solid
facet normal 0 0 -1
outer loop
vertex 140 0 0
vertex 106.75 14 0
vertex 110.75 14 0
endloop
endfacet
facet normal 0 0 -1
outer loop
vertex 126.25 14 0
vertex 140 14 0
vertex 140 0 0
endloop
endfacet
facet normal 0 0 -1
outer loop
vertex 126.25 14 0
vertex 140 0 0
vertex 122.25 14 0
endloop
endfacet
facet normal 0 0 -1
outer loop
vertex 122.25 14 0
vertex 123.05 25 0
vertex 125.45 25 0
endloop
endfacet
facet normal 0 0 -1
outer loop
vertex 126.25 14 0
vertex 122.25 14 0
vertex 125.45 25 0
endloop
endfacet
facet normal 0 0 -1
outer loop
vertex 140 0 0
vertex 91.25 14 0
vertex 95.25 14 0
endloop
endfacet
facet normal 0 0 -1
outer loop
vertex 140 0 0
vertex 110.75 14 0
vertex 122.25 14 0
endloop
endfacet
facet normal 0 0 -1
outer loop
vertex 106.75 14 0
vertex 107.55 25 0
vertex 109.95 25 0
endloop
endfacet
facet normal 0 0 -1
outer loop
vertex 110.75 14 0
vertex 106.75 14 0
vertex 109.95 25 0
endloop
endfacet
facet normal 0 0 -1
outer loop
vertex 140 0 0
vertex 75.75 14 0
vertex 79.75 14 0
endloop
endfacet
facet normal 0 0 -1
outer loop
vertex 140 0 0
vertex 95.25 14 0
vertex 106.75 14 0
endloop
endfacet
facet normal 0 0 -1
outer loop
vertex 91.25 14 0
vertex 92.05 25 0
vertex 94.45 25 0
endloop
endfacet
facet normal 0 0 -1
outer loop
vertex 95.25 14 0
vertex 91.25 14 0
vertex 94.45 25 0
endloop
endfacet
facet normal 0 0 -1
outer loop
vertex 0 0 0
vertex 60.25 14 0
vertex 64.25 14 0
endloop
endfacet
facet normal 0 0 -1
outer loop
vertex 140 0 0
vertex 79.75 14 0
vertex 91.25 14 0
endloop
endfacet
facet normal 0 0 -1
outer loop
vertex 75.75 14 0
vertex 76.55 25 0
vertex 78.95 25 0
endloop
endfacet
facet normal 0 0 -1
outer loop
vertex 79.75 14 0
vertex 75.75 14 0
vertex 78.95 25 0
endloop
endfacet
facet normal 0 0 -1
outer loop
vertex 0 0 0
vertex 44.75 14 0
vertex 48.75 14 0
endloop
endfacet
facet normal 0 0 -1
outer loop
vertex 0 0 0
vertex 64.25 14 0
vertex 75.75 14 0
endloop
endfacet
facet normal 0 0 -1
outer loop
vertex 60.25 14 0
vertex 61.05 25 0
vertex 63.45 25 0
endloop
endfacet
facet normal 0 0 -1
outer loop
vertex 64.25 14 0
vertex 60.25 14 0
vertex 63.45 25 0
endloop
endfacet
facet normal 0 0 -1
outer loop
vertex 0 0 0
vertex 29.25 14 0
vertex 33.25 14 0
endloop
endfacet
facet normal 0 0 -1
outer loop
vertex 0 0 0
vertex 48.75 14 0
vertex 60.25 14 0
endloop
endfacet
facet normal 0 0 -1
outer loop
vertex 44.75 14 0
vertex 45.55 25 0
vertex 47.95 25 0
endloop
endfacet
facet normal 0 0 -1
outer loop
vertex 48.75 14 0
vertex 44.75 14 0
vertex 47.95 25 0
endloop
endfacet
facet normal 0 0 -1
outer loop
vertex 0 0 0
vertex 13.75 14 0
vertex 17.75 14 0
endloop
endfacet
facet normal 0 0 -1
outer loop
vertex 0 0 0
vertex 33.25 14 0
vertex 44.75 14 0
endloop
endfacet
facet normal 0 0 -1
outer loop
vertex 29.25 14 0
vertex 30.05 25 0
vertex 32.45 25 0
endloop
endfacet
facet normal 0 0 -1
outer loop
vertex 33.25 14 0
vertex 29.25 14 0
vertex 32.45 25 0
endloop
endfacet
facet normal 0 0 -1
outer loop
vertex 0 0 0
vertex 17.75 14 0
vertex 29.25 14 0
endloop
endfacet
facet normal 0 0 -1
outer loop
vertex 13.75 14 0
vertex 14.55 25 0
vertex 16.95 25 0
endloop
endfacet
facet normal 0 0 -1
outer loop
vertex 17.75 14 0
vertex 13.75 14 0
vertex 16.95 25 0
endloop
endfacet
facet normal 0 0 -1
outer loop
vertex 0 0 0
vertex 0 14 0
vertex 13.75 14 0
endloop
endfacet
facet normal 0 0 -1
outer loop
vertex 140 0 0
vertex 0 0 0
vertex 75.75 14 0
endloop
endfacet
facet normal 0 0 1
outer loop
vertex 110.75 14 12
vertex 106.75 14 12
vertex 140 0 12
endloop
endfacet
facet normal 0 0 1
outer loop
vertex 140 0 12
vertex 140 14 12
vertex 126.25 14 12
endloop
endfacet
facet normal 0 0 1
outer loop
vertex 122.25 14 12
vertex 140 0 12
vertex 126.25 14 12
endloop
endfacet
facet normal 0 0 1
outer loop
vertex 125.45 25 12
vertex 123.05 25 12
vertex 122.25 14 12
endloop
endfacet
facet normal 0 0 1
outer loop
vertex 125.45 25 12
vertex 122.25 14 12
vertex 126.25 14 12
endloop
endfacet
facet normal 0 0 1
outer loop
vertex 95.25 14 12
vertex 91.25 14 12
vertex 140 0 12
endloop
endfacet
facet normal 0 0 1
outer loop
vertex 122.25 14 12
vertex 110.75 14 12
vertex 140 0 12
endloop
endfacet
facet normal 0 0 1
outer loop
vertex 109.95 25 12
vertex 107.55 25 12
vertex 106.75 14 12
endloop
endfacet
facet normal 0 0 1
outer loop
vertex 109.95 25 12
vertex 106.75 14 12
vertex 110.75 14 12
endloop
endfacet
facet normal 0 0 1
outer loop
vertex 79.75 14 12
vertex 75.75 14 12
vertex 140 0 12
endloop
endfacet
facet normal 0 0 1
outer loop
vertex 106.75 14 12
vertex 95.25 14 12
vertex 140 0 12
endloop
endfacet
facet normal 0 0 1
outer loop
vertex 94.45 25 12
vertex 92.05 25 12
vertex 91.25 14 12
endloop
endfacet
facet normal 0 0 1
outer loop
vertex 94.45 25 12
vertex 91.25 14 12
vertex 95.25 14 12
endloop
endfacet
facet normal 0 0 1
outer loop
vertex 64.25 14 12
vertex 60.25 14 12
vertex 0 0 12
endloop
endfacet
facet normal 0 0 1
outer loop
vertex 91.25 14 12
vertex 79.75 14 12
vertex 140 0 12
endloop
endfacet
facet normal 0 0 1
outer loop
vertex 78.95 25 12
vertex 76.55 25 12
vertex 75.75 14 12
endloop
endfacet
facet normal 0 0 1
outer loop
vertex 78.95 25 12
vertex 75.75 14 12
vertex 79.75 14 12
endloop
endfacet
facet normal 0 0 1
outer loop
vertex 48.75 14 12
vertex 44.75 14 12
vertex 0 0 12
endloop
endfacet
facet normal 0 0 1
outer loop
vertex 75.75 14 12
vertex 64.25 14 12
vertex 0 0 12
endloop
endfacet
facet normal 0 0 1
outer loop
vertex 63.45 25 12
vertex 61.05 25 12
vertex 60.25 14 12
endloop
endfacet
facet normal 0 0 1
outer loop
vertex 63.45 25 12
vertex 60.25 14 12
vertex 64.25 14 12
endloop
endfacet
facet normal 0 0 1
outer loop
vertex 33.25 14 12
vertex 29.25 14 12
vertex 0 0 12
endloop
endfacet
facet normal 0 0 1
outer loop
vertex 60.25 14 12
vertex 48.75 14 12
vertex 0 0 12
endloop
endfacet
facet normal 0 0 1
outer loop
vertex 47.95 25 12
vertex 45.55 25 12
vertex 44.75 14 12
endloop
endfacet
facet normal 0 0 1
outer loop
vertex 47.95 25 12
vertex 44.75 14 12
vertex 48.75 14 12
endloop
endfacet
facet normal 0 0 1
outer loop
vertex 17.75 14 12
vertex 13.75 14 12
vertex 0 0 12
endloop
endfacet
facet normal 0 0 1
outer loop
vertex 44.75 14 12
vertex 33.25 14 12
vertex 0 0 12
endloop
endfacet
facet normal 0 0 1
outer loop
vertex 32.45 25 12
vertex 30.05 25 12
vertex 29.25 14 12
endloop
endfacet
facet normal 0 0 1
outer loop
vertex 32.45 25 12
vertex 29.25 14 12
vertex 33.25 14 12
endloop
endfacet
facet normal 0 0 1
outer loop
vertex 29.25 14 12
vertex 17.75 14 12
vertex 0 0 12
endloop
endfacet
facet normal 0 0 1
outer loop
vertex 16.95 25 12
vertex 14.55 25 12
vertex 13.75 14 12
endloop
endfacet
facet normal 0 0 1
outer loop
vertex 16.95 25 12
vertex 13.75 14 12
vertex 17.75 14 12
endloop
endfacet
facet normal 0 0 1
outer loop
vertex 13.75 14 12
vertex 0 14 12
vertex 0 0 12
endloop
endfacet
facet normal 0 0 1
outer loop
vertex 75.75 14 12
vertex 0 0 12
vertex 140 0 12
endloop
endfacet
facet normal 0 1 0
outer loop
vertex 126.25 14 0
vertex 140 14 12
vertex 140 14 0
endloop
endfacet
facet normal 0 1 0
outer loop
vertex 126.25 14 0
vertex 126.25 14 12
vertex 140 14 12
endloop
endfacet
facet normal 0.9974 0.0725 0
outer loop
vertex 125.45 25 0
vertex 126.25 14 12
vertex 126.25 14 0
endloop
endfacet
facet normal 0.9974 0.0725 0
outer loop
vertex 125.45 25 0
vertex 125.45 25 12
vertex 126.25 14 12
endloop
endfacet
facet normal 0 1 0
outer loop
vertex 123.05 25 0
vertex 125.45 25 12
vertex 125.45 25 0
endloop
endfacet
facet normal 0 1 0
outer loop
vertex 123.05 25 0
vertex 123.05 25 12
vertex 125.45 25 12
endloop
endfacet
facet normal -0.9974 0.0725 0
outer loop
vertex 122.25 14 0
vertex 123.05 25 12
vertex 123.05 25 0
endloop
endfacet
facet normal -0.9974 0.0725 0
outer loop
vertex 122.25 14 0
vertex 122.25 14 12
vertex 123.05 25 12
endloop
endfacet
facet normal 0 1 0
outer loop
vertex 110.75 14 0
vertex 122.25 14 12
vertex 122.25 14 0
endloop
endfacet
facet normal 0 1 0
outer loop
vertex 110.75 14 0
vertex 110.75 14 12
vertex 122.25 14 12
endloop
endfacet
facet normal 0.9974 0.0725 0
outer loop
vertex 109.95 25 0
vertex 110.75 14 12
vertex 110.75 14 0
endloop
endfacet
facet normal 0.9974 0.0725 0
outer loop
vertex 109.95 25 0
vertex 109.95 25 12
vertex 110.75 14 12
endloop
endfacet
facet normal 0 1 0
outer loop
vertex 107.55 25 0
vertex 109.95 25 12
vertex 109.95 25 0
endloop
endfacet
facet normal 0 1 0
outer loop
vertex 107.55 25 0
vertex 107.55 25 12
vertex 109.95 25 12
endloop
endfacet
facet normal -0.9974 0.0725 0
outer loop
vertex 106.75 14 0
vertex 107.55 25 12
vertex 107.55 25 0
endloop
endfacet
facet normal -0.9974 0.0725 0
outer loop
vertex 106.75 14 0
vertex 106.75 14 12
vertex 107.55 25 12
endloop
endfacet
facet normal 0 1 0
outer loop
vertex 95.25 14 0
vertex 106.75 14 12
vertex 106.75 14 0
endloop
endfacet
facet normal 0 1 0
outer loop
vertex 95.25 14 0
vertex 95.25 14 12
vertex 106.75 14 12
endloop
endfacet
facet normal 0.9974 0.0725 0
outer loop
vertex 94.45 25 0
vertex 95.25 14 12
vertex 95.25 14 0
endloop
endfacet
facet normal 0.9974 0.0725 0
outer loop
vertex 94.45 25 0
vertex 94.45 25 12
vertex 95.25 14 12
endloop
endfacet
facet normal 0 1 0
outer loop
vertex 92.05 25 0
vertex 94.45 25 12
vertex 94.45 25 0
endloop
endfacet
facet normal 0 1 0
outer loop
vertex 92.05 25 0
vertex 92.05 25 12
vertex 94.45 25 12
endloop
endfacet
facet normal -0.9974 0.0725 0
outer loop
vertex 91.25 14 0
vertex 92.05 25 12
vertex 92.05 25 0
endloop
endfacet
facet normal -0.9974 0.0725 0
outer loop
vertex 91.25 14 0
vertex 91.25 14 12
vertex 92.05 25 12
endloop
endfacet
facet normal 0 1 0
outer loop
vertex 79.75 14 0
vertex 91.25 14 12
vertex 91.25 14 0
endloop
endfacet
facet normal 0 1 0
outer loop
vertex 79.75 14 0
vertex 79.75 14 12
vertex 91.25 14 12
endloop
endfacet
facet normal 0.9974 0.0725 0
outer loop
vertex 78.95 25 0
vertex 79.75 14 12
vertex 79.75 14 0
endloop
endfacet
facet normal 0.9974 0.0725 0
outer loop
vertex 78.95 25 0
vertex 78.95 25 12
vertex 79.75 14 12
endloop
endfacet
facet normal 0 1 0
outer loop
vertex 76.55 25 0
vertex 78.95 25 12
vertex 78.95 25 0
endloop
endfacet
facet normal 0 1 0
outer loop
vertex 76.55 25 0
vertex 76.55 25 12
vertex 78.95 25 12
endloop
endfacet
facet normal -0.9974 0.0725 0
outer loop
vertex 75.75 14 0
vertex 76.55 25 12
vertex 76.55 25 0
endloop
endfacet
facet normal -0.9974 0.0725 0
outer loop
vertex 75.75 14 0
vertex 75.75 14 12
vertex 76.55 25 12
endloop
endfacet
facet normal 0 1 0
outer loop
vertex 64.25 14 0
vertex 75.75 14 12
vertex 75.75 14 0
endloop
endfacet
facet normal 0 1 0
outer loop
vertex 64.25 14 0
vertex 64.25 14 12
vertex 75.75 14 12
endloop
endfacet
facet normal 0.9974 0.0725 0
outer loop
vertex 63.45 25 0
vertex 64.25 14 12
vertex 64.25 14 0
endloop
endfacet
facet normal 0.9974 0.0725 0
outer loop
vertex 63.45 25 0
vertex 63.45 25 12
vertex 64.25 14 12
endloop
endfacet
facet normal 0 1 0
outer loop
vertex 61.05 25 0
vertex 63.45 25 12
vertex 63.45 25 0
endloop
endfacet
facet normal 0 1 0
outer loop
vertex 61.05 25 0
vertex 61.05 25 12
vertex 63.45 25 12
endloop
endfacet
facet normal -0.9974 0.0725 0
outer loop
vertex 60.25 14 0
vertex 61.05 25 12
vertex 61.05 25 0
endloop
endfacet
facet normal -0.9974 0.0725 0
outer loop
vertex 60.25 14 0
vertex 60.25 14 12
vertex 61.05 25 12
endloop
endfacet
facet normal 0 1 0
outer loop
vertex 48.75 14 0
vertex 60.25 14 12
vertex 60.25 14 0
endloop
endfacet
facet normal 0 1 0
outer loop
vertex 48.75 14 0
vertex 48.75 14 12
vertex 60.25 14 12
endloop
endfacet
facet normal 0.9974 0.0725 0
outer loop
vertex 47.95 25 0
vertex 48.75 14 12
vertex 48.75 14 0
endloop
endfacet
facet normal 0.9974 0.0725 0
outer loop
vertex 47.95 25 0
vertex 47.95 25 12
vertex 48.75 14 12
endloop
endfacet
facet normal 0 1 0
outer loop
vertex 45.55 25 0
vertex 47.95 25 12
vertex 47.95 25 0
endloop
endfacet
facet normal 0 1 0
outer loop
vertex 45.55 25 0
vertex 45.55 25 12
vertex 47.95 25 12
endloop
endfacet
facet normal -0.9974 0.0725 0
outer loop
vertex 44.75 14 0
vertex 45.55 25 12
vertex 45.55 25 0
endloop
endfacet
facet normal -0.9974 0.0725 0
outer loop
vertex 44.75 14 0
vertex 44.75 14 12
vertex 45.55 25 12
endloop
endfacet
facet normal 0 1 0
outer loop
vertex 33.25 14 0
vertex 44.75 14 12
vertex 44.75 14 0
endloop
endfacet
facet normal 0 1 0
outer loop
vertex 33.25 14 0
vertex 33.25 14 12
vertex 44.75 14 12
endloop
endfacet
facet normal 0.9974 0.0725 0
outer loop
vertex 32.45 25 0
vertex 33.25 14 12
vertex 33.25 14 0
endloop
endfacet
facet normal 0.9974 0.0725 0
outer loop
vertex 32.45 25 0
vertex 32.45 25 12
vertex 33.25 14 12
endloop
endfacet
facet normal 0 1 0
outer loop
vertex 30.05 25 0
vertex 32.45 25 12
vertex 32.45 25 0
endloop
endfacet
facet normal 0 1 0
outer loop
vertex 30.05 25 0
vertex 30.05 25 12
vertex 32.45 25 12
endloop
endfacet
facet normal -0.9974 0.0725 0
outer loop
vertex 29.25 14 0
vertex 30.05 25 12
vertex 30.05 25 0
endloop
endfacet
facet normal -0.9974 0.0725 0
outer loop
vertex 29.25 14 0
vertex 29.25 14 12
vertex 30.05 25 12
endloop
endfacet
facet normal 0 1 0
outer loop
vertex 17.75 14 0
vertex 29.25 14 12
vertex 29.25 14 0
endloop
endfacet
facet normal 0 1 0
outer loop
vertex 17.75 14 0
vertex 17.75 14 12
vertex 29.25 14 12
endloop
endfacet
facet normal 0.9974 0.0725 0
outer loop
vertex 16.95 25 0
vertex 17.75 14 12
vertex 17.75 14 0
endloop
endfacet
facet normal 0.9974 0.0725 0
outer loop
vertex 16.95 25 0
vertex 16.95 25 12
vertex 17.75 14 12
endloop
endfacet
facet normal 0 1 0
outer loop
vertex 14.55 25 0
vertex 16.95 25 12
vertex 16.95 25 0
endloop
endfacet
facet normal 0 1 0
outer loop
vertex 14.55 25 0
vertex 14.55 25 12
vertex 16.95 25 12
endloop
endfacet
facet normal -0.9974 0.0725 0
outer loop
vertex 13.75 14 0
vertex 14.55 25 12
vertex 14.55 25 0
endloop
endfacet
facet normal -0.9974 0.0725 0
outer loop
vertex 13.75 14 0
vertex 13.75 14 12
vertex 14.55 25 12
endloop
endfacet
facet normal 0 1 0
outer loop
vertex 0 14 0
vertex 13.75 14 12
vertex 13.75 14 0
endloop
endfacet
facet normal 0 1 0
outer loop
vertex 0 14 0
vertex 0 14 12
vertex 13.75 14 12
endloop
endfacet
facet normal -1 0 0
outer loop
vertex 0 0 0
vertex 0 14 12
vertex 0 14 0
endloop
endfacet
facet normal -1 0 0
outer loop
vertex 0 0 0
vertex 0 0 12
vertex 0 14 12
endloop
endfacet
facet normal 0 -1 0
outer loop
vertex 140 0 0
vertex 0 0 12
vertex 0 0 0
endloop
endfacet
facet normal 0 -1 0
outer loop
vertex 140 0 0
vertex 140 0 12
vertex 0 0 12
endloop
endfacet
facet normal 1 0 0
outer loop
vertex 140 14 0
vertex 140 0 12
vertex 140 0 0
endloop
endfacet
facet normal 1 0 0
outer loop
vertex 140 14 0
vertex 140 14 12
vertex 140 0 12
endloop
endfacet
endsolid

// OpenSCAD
$fn = 32;

// ----------------------------------------------------------------------
// Gear rack: 8 teeth on a 140 mm bar, pitch 15.5 mm
// ----------------------------------------------------------------------

// --- parameters (mm) ---
profile_height = 12;      // extrusion height
profile_points = 36;      // points of the closed outline

profile = [[0, 0], [140, 0], [140, 14], [126.25, 14], [125.45, 25], [123.05, 25], [122.25, 14], [110.75, 14], [109.95, 25], [107.55, 25], [106.75, 14], [95.25, 14], [94.45, 25], [92.05, 25], [91.25, 14], [79.75, 14], [78.95, 25], [76.55, 25], [75.75, 14], [64.25, 14], [63.45, 25], [61.05, 25], [60.25, 14], [48.75, 14], [47.95, 25], [45.55, 25], [44.75, 14], [33.25, 14], [32.45, 25], [30.05, 25], [29.25, 14], [17.75, 14], [16.95, 25], [14.55, 25], [13.75, 14], [0, 14]];  // single closed polygon, 36 points, counter clockwise

// --- the one profile operation ---
linear_extrude(height = profile_height) polygon(points = profile);
